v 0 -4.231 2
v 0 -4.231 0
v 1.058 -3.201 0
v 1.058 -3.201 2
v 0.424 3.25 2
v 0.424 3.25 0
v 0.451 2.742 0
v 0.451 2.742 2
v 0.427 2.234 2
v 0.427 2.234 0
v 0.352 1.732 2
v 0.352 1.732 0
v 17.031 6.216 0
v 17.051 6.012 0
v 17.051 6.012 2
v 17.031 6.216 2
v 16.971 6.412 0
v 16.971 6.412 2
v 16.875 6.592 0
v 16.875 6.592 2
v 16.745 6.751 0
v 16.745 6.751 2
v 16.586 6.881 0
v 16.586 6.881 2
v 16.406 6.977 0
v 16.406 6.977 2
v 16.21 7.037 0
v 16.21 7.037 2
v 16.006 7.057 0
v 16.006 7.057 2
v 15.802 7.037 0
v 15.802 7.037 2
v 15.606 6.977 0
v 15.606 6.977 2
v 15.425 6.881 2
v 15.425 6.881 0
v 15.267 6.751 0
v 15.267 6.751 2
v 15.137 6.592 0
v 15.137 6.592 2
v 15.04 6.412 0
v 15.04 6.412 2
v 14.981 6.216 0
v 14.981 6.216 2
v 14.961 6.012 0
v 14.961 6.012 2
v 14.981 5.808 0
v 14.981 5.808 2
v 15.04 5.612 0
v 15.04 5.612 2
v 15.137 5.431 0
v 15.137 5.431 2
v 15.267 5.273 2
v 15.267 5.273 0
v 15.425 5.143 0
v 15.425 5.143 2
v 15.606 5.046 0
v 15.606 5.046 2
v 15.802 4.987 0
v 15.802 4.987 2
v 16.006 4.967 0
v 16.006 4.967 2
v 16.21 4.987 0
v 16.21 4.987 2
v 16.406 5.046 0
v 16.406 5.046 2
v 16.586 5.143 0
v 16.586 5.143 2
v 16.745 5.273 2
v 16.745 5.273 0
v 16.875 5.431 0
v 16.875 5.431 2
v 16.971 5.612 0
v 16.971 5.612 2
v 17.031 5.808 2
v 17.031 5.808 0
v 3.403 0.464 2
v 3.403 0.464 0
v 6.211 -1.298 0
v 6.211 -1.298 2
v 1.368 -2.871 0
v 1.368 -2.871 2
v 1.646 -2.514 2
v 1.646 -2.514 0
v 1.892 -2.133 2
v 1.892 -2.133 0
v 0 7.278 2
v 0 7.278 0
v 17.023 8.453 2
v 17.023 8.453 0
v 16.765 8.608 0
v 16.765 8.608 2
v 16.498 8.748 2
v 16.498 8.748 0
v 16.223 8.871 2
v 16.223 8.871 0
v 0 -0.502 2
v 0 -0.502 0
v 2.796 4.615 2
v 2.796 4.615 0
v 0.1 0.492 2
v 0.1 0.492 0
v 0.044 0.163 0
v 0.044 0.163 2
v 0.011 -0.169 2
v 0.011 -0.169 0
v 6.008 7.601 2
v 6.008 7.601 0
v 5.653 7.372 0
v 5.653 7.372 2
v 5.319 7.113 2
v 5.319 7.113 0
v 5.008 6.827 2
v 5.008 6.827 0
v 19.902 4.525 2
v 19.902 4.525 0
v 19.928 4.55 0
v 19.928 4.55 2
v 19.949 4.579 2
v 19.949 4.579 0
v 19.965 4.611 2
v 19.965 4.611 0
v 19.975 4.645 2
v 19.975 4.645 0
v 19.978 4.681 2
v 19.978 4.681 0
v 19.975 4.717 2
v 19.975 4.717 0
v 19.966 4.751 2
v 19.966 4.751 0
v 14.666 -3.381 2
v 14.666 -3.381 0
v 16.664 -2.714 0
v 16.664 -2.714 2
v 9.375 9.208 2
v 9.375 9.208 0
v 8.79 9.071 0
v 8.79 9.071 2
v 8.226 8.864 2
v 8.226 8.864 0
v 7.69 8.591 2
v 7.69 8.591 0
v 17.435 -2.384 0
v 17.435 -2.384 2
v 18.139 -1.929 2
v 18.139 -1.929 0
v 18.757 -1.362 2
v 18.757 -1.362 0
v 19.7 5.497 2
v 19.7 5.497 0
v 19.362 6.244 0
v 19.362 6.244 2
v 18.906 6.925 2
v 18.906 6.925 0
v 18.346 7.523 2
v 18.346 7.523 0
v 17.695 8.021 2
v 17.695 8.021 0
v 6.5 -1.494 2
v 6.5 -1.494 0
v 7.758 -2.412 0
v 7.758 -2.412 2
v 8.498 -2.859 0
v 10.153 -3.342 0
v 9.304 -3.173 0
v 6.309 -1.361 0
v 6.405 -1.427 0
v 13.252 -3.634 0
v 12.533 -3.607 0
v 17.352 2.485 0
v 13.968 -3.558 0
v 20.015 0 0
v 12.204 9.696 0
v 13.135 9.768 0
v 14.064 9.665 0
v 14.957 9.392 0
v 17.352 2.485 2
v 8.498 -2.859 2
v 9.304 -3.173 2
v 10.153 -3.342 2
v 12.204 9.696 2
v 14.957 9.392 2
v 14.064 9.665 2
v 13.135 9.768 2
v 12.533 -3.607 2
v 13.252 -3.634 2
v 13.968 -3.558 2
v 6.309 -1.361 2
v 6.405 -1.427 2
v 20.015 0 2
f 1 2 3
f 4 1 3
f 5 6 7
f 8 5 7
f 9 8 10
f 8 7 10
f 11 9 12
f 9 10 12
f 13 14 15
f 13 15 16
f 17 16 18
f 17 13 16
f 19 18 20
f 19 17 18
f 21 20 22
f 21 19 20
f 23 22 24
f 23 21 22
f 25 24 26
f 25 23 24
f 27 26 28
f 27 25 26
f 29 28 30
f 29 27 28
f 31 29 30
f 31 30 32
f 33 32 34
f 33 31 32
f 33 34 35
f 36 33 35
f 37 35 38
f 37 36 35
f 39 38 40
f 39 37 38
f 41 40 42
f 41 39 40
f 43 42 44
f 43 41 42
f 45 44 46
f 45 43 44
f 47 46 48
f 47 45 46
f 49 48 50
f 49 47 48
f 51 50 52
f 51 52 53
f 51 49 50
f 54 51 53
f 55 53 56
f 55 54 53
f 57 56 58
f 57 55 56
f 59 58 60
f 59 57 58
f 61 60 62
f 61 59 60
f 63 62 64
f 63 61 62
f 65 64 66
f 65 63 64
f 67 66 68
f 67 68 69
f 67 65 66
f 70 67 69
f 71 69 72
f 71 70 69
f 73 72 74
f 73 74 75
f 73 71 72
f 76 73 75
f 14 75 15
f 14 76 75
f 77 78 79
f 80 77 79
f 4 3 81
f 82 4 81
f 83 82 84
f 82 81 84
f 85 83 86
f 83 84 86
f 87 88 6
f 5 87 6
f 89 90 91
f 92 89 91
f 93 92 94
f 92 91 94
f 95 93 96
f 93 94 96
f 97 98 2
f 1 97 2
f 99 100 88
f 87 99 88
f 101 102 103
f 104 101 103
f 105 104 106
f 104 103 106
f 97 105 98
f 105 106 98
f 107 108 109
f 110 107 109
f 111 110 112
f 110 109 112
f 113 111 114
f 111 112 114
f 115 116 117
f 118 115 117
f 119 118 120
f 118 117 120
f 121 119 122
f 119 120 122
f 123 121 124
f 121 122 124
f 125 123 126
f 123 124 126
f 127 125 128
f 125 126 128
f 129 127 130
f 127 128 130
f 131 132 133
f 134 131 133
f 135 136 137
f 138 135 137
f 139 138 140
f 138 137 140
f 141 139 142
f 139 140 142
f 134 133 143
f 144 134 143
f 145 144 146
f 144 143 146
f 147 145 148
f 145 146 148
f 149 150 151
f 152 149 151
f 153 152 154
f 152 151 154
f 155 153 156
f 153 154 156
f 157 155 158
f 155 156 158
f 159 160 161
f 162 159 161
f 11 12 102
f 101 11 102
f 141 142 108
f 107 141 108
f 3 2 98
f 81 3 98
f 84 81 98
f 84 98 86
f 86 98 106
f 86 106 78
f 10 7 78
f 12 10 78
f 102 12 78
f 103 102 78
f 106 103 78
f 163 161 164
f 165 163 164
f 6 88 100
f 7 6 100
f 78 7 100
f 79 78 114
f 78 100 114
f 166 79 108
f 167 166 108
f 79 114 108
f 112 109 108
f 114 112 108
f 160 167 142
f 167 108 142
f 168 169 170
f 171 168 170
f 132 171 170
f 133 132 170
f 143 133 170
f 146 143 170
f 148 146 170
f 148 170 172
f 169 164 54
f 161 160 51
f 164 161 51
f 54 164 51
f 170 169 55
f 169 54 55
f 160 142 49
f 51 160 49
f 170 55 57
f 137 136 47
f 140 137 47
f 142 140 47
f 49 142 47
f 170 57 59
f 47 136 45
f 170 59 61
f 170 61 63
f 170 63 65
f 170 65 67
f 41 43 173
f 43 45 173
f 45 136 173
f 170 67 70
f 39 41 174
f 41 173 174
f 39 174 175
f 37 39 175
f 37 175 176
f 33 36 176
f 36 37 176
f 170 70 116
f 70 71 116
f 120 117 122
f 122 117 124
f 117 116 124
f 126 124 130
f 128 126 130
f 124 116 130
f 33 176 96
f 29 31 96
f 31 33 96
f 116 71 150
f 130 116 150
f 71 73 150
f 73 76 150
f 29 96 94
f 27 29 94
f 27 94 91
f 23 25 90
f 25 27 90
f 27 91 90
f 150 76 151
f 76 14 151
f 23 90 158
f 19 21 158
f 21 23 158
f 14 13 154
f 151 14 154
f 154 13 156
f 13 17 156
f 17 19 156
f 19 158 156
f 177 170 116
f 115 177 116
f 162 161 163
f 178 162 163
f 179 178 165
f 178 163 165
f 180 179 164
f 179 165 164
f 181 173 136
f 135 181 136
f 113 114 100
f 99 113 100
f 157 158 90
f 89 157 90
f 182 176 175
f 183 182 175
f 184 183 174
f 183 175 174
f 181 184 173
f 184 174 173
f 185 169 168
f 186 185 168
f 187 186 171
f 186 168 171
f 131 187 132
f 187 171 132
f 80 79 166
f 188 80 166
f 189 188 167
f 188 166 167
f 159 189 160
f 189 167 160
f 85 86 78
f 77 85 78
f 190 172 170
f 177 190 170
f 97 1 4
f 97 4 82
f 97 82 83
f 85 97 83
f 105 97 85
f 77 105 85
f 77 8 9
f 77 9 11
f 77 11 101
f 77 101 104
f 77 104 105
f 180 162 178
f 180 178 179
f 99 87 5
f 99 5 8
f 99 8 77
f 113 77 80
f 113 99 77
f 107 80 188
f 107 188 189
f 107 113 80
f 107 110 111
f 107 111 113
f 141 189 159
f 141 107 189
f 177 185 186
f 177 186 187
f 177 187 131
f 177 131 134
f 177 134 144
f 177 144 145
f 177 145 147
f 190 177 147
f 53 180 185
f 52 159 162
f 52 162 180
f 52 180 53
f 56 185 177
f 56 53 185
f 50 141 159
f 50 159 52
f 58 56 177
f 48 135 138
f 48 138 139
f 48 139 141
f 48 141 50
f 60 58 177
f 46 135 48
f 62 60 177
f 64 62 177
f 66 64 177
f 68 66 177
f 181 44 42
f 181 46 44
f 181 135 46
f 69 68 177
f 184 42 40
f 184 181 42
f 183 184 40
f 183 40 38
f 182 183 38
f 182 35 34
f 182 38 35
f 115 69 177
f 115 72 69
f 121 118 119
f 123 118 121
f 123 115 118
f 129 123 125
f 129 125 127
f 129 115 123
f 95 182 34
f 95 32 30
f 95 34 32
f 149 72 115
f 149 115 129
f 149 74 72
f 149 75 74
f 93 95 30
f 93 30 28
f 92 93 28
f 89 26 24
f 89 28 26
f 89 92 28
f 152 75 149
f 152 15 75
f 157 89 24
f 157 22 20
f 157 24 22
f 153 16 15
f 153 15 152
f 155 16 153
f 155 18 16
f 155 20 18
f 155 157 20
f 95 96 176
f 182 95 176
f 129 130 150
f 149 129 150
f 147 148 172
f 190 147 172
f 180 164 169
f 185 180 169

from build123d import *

# Parameters (mm, degrees)
F0_R     = 1.044961
F1_DEPTH = 2


with BuildPart() as f1:
    # F0 (on Top) → F1 (new body)
    with BuildSketch(Plane.XY):
        with BuildLine():
            Line((5.007722, 6.82725), (2.795858, 4.615385))
            Line((2.795858, 4.615385), (0, 7.278107))
            Line((0, 7.278107), (0.423993, 3.249794))
            ThreePointArc((0.423993, 3.249794), (0.445773, 2.488009), (0.351528, 1.731763))
            Line((0.351528, 1.731763), (0.099933, 0.492308))
            ThreePointArc((0.099933, 0.492308), (0.025046, -0.002516), (0, -0.502348))
            Line((0, -0.502348), (0, -4.231373))
            Line((0, -4.231373), (1.057963, -3.201267))
            ThreePointArc((1.057963, -3.201267), (1.511144, -2.695677), (1.89165, -2.133352))
            Line((1.89165, -2.133352), (3.402669, 0.463712))
            Line((3.402669, 0.463712), (6.210531, -1.298084))
            ThreePointArc((6.210531, -1.298084), (6.357115, -1.393674), (6.500264, -1.494334))
            Line((6.500264, -1.494334), (7.757519, -2.411716))
            ThreePointArc((7.757519, -2.411716), (8.894254, -3.033361), (10.15255, -3.342065))
            Line((10.15255, -3.342065), (12.532795, -3.606537))
            ThreePointArc((12.532795, -3.606537), (13.611706, -3.609293), (14.666091, -3.380534))
            Line((14.666091, -3.380534), (16.664257, -2.714479))
            ThreePointArc((16.664257, -2.714479), (17.796263, -2.170925), (18.757136, -1.362462))
            Line((18.757136, -1.362462), (20.014793, 0))
            Line((20.014793, 0), (17.352073, 2.485207))
            Line((17.352073, 2.485207), (19.902285, 4.525379))
            ThreePointArc((19.902285, 4.525379), (19.970428, 4.627975), (19.966333, 4.751071))
            Line((19.966333, 4.751071), (19.69989, 5.497113))
            ThreePointArc((19.69989, 5.497113), (18.906432, 6.925225), (17.694968, 8.021325))
            Line((17.694968, 8.021325), (17.023118, 8.453229))
            ThreePointArc((17.023118, 8.453229), (16.632537, 8.680065), (16.223079, 8.870728))
            Line((16.223079, 8.870728), (14.957098, 9.392014))
            ThreePointArc((14.957098, 9.392014), (13.601922, 9.738439), (12.203814, 9.695924))
            Line((12.203814, 9.695924), (9.375468, 9.208279))
            ThreePointArc((9.375468, 9.208279), (8.504739, 8.97573), (7.689901, 8.590649))
            Line((7.689901, 8.590649), (6.008156, 7.601387))
            ThreePointArc((6.008156, 7.601387), (5.483359, 7.246084), (5.007722, 6.82725))
        make_face()
        with Locations((16.005702, 6.011697)):
            Circle(F0_R, mode=Mode.SUBTRACT)
    extrude(amount=F1_DEPTH)


solid = f1.part
